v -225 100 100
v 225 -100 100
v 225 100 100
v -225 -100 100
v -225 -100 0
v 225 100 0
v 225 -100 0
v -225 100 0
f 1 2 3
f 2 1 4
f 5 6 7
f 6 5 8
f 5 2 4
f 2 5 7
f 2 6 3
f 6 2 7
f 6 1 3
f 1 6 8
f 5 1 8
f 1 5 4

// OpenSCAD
intersection(){
  face();
  letters();
}
base();


module face(){
translate([-270,0,-10]) rotate([90,0,0])
  linear_extrude(height=200,center=true)
    import("./pugface.dxf");}

module letters(){
translate([0,0,540]) rotate([90,0,-90])
  linear_extrude(height=600,center=true)
    text("PUG",size=160,direction="ttb",spacing=0.7);}

module base(){
translate([-225,-100,0])
  cube([450,200,100]);}
